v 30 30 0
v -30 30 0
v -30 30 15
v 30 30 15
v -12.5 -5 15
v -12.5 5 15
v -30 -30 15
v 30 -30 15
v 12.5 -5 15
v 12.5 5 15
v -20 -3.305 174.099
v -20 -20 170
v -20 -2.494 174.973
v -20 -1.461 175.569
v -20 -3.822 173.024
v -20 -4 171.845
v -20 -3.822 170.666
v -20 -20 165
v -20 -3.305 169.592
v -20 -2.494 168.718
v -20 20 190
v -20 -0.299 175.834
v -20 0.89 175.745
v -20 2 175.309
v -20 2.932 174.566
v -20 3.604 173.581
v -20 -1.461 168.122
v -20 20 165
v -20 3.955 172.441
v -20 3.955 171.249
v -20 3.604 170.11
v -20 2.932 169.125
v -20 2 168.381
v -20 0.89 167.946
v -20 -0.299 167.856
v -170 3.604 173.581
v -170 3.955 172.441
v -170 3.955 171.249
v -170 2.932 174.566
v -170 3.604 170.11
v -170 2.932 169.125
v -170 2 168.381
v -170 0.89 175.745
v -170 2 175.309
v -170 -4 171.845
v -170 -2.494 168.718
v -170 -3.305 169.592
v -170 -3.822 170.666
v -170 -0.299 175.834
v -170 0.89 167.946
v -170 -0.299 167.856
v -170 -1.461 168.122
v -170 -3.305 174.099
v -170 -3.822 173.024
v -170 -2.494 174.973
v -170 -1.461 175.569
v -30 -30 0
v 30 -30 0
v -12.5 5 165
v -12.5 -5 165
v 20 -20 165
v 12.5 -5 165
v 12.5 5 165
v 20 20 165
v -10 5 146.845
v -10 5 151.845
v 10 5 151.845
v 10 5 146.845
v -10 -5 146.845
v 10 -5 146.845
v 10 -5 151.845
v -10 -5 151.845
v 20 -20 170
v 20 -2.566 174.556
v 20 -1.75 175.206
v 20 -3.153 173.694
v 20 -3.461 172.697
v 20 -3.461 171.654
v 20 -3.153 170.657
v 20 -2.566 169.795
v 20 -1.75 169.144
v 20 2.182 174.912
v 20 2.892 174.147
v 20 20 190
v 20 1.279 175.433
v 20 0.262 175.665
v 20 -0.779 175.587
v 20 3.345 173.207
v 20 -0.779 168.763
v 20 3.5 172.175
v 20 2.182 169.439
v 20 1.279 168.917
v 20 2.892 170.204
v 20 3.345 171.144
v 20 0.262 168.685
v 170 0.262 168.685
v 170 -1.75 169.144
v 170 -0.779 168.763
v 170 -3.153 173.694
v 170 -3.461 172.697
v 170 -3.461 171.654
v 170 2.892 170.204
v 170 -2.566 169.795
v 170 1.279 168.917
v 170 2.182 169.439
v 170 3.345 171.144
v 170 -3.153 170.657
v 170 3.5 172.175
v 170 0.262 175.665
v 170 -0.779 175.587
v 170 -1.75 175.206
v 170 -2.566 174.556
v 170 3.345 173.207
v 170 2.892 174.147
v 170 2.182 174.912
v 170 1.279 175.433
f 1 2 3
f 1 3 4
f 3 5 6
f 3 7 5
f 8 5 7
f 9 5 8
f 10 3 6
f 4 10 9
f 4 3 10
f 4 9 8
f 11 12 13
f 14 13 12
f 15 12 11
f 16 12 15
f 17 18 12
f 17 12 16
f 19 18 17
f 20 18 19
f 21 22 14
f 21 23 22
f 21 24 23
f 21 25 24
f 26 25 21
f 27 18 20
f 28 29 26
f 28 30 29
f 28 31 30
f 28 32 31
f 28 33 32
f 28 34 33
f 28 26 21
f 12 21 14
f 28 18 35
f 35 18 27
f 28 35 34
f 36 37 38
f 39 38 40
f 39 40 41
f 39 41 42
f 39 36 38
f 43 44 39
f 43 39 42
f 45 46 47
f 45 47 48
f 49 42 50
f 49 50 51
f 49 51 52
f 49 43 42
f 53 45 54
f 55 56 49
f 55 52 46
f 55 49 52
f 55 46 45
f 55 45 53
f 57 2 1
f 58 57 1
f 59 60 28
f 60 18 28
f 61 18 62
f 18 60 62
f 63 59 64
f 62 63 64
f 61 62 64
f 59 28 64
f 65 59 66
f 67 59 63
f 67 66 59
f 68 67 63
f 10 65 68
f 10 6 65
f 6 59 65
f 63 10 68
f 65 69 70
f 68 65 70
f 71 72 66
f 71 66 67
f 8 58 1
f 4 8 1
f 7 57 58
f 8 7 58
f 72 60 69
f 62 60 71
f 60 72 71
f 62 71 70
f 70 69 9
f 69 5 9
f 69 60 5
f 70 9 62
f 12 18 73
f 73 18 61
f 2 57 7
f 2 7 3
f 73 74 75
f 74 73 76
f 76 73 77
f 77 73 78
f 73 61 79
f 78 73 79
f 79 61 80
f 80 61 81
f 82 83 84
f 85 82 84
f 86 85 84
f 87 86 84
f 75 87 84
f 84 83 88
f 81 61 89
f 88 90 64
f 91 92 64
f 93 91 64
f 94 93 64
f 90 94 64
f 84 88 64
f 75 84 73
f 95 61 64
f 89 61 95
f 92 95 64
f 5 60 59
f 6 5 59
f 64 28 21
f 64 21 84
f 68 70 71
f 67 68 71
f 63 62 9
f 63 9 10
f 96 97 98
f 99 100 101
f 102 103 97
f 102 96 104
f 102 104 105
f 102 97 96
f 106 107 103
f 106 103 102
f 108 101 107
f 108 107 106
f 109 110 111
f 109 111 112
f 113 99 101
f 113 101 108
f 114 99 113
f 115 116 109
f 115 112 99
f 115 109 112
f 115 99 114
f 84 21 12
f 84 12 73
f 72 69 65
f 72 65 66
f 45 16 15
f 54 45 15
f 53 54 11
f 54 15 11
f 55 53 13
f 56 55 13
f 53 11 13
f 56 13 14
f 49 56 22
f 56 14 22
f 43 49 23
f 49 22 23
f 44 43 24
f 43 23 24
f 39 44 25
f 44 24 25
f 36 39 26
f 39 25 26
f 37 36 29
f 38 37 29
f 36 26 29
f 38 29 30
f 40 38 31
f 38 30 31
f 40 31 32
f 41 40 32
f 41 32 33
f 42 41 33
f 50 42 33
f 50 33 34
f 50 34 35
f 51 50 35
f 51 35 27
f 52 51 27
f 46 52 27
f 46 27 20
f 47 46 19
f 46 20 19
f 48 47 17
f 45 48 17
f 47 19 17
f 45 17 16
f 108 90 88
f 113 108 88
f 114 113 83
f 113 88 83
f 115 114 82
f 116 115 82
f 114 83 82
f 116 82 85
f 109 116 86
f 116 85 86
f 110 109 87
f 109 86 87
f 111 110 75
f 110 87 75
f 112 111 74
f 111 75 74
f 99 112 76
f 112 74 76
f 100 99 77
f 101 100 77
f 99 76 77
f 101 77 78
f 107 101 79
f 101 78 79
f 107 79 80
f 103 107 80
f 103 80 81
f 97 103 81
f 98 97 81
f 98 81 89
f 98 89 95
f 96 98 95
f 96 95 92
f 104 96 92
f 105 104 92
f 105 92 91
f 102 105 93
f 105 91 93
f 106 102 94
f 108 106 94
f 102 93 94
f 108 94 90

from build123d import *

# Parameters (mm, degrees)
F0_W      = 60
F0_H      = 60
F1_DEPTH  = 15
F2_W      = 25
F2_H      = 10
F3_DEPTH  = 150
F4_W      = 40
F4_H      = 40
F4_W_2    = 25
F4_H_2    = 10
F5_DEPTH  = 25
F6_SIZE2  = 39.99999
F6_SIZE   = 19.99999
F7_W      = 20
F7_H      = 5
F8_DEPTH  = 25
F9_R      = 3.5
F10_DEPTH = 150
F11_R     = 4
F12_DEPTH = 150


# Not quite as in the source:
# - a fillet or chamfer is up to 0.001 mm smaller than in the source, because OpenCascade refuses the exact size


with BuildPart() as f1:
    # F0 (on Top) → F1 (new body)
    with BuildSketch(Plane.XY):
        Rectangle(F0_W, F0_H)
    extrude(amount=F1_DEPTH)

    # F2 (on face) → F3 (join)
    with BuildSketch(Plane.XY.offset(15)):
        Rectangle(F2_W, F2_H)
    extrude(amount=F3_DEPTH)

    # F4 (on face) → F5 (join)
    with BuildSketch(Plane.XY.offset(165)):
        Rectangle(F4_W, F4_H)
        Rectangle(F4_W_2, F4_H_2, mode=Mode.SUBTRACT)
        Rectangle(F4_W_2, F4_H_2)
    extrude(amount=F5_DEPTH)

    # F6 (size 20 and 40 in the source; OpenCascade refuses exactly that, so slightly less here)
    f6_edges = [f1.edges().sort_by_distance(p)[0] for p in [
        (0, -20, 190),
    ]]
    f6_side = f1.faces().sort_by_distance((0, -20, 177.5))[0]
    chamfer(f6_edges, length=F6_SIZE, length2=F6_SIZE2, reference=f6_side)

    # F7 (on face) → F8 (cut)
    with BuildSketch(Plane.XZ.offset(5)):
        with Locations((0, 149.3448019028)):
            Rectangle(F7_W, F7_H)
    extrude(amount=-F8_DEPTH, mode=Mode.SUBTRACT)

    # F9 (on face) → F10 (join)
    with BuildSketch(Plane.YZ.offset(20)):
        with Locations((0, 172.1751581079)):
            Circle(F9_R)
    extrude(amount=F10_DEPTH)

    # F11 (on face) → F12 (join)
    with BuildSketch(Plane(origin=(-20, 0, 0), x_dir=(0, -1, 0), z_dir=(-1, 0, 0))):
        with Locations((0, 171.8452831515)):
            Circle(F11_R)
    extrude(amount=F12_DEPTH)


solid = f1.part
